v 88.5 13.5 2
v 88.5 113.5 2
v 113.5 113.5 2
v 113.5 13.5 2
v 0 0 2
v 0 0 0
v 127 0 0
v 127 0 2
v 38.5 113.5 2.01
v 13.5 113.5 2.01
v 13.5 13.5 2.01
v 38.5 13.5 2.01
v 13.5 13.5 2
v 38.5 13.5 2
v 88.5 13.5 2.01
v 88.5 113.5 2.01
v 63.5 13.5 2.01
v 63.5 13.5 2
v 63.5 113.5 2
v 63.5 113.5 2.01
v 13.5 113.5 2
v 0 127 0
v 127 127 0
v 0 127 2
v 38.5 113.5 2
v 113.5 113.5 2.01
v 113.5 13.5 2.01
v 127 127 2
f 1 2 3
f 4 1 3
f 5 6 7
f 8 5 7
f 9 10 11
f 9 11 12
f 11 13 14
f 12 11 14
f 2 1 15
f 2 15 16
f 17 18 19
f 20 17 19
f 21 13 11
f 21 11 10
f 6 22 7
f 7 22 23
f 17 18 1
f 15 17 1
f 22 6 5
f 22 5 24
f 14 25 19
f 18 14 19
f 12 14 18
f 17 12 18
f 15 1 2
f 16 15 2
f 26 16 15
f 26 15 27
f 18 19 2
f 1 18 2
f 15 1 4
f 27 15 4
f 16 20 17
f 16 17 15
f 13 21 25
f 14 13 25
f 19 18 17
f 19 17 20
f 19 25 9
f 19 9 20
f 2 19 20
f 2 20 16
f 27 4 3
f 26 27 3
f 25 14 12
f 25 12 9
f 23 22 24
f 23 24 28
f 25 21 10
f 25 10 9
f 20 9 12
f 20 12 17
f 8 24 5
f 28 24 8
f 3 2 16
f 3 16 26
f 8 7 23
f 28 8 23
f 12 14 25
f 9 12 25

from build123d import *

# Parameters (mm, degrees)
F0_W     = 127
F0_H     = 127
F1_DEPTH = 2
F2_W     = 25
F2_H     = 100
F3_DEPTH = 0.01
F4_DEPTH = 0.01
F5_DEPTH = 0.01
F6_DEPTH = 0.01


with BuildPart() as f1:
    # F0 (on Top) → F1 (new body)
    with BuildSketch(Plane.XY):
        with Locations((63.5, 63.5)):
            Rectangle(F0_W, F0_H)
    extrude(amount=F1_DEPTH)


with BuildPart() as f3:
    # F2 (on face) → F3 (new body)
    with BuildSketch(Plane.XY.offset(2)):
        with Locations((26, 63.5)):
            Rectangle(F2_W, F2_H)
    extrude(amount=F3_DEPTH)


with BuildPart() as f4:
    # F2 (on face) → F4 (new body)
    with BuildSketch(Plane.XY.offset(2)):
        with Locations((51, 63.5)):
            Rectangle(F2_W, F2_H)
    extrude(amount=F4_DEPTH)


with BuildPart() as f5:
    # F2 (on face) → F5 (new body)
    with BuildSketch(Plane.XY.offset(2)):
        with Locations((76, 63.5)):
            Rectangle(F2_W, F2_H)
    extrude(amount=F5_DEPTH)


with BuildPart() as f6:
    # F2 (on face) → F6 (new body)
    with BuildSketch(Plane.XY.offset(2)):
        with Locations((101, 63.5)):
            Rectangle(F2_W, F2_H)
    extrude(amount=F6_DEPTH)


solid = Compound([f1.part, f3.part, f4.part, f5.part, f6.part])
